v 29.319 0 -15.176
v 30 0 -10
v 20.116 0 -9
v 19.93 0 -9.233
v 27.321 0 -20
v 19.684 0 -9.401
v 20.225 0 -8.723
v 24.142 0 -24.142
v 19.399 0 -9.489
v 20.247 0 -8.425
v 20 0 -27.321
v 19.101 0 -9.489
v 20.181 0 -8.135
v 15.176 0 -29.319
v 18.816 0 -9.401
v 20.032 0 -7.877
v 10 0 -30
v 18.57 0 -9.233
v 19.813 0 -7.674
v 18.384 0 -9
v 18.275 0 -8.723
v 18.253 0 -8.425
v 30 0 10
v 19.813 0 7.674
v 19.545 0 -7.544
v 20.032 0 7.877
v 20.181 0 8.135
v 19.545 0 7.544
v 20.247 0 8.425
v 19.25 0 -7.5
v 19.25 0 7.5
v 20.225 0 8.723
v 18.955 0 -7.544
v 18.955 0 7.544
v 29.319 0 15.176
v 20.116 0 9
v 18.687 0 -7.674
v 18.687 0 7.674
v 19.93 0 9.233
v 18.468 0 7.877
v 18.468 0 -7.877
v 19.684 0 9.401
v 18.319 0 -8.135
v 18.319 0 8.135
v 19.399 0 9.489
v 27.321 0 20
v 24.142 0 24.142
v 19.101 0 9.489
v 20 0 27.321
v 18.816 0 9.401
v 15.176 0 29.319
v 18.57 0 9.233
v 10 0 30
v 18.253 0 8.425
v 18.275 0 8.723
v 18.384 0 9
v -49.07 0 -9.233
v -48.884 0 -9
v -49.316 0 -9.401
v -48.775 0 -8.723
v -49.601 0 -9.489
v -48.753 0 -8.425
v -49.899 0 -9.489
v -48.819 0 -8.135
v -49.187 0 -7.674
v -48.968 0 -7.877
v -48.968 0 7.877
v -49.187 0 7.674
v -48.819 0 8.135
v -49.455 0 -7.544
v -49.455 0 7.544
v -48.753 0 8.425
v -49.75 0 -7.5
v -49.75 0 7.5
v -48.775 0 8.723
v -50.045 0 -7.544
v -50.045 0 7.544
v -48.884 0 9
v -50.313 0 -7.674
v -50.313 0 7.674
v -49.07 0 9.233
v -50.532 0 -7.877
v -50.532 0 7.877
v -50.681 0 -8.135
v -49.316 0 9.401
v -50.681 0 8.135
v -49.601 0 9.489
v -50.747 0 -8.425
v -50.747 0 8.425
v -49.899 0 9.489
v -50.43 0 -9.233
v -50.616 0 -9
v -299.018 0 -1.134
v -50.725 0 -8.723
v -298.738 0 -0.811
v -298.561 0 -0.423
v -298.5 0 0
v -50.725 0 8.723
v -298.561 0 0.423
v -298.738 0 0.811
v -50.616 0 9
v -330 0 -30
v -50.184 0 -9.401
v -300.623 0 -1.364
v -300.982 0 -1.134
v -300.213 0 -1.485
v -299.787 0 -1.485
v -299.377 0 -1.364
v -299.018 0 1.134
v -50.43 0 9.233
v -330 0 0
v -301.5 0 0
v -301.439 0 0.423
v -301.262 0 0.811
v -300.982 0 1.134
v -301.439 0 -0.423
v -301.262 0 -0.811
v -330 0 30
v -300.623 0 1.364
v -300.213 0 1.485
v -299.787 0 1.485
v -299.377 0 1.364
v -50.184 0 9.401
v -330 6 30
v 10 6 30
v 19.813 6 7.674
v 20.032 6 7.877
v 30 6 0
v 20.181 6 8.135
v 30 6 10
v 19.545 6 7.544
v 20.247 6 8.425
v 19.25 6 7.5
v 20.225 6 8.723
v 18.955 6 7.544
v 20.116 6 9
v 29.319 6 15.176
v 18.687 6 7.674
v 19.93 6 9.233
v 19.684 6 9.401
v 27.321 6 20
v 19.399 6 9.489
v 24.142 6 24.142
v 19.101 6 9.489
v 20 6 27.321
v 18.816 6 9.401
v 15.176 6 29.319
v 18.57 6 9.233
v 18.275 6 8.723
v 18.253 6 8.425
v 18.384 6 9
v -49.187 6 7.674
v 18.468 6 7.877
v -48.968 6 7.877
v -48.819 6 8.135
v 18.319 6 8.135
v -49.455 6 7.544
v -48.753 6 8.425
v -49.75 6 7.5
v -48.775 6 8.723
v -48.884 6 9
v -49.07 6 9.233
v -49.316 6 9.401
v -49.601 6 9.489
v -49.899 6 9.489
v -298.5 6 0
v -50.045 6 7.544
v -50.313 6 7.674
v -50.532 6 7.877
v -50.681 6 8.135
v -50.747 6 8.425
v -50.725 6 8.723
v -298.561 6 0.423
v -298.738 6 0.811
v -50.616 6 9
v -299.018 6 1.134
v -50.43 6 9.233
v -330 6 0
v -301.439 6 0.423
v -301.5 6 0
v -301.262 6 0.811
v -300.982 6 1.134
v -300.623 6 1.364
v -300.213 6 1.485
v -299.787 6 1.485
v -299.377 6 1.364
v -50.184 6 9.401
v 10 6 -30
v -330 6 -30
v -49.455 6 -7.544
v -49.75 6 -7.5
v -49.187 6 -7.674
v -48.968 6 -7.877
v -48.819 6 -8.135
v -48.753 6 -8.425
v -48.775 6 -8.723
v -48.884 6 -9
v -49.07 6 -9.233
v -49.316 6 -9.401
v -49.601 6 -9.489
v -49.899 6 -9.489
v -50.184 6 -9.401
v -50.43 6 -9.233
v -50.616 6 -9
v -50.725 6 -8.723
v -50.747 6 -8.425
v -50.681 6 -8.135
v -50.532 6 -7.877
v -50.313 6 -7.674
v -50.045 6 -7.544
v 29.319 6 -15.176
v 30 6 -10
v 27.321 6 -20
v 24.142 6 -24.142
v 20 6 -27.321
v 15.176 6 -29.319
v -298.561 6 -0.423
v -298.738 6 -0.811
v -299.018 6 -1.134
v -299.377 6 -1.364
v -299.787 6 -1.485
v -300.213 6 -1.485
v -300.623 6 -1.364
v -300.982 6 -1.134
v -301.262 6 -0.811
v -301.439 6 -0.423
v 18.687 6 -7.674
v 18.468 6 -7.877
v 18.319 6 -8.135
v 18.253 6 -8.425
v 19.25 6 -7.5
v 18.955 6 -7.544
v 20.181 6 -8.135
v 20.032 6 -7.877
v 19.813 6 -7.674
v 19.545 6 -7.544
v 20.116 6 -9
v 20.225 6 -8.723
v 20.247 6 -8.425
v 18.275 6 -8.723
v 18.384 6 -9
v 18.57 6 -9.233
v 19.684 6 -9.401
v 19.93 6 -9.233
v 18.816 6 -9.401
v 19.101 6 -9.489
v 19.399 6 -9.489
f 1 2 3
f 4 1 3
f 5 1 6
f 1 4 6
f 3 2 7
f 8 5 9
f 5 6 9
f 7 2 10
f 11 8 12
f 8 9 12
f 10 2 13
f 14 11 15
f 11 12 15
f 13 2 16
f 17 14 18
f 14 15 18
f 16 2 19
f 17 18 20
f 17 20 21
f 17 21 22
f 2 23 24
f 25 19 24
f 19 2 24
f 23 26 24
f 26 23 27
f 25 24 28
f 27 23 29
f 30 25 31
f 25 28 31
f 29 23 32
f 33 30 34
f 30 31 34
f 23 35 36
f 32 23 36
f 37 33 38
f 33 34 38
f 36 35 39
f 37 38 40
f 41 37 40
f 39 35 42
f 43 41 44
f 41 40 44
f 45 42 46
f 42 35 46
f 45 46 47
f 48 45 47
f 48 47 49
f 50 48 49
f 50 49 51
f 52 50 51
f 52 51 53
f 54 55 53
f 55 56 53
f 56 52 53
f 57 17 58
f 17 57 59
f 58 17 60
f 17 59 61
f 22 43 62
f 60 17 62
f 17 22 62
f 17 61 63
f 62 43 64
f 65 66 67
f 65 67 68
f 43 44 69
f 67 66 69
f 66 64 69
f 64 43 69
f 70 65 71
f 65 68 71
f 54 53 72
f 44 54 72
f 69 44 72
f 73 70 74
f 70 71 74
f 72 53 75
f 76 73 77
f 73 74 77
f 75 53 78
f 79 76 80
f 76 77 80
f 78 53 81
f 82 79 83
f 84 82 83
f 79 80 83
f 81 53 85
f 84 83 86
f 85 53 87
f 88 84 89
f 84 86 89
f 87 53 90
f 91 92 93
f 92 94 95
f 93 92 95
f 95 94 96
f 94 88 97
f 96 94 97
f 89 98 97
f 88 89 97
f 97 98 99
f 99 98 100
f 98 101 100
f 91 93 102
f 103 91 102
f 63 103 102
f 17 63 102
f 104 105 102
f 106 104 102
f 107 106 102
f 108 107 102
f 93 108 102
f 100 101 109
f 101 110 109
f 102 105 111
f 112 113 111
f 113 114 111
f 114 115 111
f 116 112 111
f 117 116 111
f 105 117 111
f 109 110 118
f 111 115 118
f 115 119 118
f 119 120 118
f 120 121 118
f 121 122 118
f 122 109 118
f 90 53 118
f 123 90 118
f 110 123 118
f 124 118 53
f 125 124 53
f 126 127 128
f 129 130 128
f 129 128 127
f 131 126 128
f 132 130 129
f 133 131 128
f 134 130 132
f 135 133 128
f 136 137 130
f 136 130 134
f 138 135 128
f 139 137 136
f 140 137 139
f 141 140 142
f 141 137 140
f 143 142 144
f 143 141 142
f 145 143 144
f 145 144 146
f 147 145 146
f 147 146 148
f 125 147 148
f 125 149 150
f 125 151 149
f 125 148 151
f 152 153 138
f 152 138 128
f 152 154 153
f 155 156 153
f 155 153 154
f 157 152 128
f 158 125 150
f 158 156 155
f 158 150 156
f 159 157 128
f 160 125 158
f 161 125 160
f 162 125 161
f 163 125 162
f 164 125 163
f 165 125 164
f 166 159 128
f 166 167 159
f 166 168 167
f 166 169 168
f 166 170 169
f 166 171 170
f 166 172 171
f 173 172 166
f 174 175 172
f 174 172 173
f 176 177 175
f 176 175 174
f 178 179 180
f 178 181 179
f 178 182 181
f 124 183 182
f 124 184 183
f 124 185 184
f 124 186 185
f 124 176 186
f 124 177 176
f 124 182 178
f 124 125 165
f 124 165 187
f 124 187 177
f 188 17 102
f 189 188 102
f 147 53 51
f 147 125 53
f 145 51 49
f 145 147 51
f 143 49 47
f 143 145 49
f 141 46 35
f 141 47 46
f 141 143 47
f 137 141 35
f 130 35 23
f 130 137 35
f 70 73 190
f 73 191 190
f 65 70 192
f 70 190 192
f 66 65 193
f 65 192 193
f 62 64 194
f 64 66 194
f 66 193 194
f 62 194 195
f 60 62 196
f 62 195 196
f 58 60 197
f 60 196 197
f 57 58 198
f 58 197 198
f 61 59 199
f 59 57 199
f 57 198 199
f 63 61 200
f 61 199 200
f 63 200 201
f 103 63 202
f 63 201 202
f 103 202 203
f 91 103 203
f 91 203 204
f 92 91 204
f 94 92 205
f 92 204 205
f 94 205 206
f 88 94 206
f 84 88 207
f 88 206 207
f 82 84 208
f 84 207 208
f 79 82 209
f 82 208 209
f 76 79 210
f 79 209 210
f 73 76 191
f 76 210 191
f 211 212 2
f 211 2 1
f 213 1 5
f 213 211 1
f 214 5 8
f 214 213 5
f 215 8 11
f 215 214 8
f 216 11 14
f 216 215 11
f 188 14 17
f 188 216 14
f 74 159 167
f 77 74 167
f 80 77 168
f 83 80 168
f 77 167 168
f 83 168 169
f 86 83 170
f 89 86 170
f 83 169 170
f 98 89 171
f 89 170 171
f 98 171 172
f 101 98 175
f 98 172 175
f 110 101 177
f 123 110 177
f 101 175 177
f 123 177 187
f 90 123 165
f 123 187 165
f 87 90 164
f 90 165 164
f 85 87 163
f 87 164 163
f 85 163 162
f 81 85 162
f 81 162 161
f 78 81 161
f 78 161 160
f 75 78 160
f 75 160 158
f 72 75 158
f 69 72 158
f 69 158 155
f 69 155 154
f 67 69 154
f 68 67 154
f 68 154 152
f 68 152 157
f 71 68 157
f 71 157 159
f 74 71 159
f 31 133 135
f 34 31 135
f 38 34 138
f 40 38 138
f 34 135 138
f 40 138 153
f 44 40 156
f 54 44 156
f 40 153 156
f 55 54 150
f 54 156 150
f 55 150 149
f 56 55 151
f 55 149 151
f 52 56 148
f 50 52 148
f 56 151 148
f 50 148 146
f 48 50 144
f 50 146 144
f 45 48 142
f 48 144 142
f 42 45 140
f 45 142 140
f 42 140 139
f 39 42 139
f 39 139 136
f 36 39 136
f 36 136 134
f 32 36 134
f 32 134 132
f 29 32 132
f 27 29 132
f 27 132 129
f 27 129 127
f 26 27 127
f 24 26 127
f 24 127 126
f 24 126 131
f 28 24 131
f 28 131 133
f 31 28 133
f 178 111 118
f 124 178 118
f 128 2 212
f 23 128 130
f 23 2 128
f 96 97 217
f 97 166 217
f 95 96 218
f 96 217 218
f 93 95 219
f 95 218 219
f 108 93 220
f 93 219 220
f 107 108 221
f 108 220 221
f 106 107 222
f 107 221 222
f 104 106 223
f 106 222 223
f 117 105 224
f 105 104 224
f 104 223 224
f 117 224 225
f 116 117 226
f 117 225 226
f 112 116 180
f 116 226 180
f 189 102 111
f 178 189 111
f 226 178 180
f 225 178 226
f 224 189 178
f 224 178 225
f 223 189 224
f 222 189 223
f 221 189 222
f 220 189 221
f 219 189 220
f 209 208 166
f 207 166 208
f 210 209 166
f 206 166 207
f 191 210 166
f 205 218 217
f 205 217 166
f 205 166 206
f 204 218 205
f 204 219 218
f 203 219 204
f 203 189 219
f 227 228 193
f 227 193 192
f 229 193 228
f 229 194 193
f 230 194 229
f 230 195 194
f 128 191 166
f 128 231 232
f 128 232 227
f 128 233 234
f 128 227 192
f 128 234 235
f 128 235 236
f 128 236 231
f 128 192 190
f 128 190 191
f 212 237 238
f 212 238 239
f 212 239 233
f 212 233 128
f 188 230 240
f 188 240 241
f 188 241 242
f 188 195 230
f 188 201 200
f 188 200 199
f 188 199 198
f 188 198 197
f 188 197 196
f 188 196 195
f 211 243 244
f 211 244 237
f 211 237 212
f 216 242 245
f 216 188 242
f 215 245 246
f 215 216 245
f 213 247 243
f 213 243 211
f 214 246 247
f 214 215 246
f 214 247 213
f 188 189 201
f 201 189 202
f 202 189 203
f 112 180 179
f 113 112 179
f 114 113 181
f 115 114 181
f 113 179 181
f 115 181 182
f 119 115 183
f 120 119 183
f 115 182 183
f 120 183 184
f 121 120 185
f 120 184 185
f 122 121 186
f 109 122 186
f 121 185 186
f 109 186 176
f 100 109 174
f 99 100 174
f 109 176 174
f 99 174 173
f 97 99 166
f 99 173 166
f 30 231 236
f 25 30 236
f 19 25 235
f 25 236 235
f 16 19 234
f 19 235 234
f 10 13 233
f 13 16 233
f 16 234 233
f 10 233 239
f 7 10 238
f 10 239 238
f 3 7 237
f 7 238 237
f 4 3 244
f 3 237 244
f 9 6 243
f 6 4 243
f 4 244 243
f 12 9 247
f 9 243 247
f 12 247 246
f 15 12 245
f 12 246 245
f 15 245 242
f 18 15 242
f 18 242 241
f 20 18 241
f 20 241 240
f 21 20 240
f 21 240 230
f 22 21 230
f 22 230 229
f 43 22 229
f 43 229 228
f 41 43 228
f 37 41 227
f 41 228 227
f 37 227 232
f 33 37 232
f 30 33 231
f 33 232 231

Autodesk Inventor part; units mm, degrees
ref_plane "YZ Plane" through (0, 0, 0) normal (1, 0, 0) x (0, 1, 0)
ref_plane "XZ Plane" through (0, 0, 0) normal (0, 1, 0) x (-1, 0, 0)
ref_plane "XY Plane" through (0, 0, 0) normal (0, 0, 1) x (1, 0, 0)
sketch "Sketch1" plane through (0, 0, 0) normal (0, 1, 0) x (-1, 0, 0)
  line L0 (0, 0) -> (-16.25, 0)
  line L1 (0, 0) -> (46.75, 0)
  line L2 (300, 0) -> (330, 0)
  line L3 (330, 30) -> (-30, 30)
  line L4 (-19.25, 8.5) -> (49.75, 8.5) construction
  line L5 (49.75, 8.5) -> (49.75, -8.5) construction
  line L6 (49.75, -8.5) -> (-19.25, -8.5) construction
  line L7 (-19.25, -8.5) -> (-19.25, 8.5) construction
  line L8 (-19.25, 8.5) -> (49.75, -8.5) construction
  line L9 (49.75, 8.5) -> (-19.25, -8.5) construction
  line L10 (-30, 0) -> (-30, 30)
  line L11 (330, 0) -> (330, 30)
  line L12 (46.75, 0) -> (300, 0)
  line L13 (-16.25, 0) -> (-30, 0)
  line L14 (0, 0) -> (-30, 0) construction
  point P0 (15.25, 0)
  point P1 (15.25, 0)
  dimension "d0" = 300
  dimension "d7" = 69
  dimension "d8" = 17
  dimension "d10" = 30
  dimension "d11" = 30
  dimension "d29" = 19.25
extrude "Extrusion1" add sketch "Sketch1" along normal blind 6
hole "Hole1" at (19.25, 0, 8.5) at (-49.75, 0, 8.5) direction (0, 1, 0) diameter 2 end through all
hole "Hole2" at (-300, 0, 0) direction (0, 1, 0) diameter 3 end through all
fillet "Fillet1" radius 20 1 edges at (30, 3, 30)
mirror "Mirror1" about plane through (16.25, 0, 0) normal (0, 0, -1)
properties part number "segment1b" material "Plywood, Finish"
